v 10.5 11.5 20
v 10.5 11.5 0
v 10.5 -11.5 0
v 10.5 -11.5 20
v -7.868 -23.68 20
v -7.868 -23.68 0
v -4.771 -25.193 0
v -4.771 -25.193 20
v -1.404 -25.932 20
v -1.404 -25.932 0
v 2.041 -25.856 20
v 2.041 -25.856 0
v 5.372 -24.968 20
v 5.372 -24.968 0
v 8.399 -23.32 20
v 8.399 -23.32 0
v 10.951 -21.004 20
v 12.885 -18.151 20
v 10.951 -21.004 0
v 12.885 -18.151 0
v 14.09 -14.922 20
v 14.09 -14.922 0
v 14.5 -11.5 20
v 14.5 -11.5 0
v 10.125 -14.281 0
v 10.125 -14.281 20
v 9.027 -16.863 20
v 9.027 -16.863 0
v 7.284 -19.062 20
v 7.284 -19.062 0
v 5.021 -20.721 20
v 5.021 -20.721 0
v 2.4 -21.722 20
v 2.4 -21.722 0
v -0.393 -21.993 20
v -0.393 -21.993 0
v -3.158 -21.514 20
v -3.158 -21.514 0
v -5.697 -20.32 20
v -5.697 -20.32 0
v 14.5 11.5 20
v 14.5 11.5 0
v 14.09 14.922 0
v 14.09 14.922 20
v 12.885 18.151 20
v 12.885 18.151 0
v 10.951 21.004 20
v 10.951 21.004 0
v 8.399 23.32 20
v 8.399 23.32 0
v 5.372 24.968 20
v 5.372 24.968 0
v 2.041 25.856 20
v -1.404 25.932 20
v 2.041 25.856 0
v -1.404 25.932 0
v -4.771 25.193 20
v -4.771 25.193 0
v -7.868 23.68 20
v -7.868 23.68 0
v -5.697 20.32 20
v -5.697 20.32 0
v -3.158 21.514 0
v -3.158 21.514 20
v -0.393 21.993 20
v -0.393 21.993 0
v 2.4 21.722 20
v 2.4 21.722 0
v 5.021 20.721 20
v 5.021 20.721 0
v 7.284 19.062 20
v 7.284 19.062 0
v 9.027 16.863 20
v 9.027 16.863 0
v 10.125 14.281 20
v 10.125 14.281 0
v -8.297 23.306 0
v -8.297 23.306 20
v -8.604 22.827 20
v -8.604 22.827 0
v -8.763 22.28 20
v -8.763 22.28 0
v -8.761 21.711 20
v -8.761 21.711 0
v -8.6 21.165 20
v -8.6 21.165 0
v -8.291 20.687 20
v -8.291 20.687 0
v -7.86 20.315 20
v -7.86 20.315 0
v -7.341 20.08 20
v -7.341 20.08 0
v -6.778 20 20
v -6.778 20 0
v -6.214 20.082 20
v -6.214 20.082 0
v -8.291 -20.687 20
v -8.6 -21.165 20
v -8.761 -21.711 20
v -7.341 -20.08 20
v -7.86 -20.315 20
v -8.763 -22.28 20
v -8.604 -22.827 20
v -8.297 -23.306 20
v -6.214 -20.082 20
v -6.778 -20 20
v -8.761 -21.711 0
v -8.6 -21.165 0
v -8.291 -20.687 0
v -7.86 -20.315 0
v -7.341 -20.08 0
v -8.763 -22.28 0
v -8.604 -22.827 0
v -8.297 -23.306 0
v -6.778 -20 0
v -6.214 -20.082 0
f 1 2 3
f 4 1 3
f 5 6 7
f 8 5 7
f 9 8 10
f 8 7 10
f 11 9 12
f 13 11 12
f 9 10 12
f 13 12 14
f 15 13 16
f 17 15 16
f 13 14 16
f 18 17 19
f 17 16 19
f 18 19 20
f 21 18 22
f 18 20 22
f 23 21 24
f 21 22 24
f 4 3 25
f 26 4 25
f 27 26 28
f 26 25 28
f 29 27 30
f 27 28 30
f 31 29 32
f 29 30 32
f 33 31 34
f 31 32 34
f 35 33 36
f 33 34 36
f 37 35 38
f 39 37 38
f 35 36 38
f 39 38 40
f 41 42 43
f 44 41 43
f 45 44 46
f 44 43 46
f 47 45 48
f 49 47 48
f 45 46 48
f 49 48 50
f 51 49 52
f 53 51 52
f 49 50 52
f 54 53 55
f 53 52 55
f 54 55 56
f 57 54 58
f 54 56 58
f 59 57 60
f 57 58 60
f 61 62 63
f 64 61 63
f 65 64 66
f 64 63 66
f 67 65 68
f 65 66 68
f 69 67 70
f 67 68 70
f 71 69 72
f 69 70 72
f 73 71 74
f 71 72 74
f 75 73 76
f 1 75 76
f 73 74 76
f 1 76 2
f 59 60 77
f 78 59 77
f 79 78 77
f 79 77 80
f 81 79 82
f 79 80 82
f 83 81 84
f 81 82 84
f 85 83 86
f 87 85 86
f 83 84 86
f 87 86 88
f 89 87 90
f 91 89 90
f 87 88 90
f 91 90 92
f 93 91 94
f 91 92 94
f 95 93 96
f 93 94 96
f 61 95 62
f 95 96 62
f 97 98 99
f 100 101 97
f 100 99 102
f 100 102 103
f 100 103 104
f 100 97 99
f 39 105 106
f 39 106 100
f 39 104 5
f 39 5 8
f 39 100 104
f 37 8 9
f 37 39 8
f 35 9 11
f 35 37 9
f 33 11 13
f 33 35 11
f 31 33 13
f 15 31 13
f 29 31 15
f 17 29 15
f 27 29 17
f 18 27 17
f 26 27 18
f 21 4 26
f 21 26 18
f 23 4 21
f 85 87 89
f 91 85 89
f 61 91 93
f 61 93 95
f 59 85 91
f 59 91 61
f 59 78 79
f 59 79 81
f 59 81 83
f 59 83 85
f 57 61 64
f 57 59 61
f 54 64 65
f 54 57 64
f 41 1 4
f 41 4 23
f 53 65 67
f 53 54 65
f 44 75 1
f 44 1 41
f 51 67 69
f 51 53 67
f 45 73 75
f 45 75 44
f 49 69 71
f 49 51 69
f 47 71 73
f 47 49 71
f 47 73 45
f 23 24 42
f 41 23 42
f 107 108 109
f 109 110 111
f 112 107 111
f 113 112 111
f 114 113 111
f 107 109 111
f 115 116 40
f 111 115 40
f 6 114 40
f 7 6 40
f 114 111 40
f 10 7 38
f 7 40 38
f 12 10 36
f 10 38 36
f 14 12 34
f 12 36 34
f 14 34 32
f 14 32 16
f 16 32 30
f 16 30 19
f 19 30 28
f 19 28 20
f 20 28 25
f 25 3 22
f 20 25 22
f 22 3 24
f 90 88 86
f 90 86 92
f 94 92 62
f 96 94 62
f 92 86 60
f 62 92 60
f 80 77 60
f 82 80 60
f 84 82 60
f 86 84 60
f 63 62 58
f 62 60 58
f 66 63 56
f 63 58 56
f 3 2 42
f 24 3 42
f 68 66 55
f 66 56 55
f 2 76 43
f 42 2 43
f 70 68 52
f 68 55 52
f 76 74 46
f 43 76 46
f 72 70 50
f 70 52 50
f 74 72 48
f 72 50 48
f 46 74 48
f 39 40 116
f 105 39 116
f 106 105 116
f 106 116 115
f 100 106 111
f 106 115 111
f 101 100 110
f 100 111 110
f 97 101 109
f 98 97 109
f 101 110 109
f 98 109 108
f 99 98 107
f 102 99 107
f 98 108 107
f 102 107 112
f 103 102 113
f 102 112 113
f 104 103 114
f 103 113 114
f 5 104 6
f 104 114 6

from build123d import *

# Parameters (mm, degrees)
F1_DEPTH = 20


with BuildPart() as f1:
    # F0 (on Top) → F1 (new body)
    with BuildSketch(Plane.XY):
        with BuildLine():
            ThreePointArc((-5.697157, 20.32), (5.021446, 20.721446), (10.5, 11.5))
            Line((10.5, 11.5), (10.5, -11.5))
            ThreePointArc((10.5, -11.5), (5.021446, -20.721446), (-5.697157, -20.32))
            ThreePointArc((-5.697157, -20.32), (-8.46233, -20.914827), (-7.867503, -23.68))
            ThreePointArc((-7.867503, -23.68), (6.934378, -24.234378), (14.5, -11.5))
            Line((14.5, -11.5), (14.5, 11.5))
            ThreePointArc((14.5, 11.5), (6.934378, 24.234378), (-7.867503, 23.68))
            ThreePointArc((-7.867503, 23.68), (-8.46233, 20.914827), (-5.697157, 20.32))
        make_face()
    extrude(amount=F1_DEPTH)


solid = f1.part
